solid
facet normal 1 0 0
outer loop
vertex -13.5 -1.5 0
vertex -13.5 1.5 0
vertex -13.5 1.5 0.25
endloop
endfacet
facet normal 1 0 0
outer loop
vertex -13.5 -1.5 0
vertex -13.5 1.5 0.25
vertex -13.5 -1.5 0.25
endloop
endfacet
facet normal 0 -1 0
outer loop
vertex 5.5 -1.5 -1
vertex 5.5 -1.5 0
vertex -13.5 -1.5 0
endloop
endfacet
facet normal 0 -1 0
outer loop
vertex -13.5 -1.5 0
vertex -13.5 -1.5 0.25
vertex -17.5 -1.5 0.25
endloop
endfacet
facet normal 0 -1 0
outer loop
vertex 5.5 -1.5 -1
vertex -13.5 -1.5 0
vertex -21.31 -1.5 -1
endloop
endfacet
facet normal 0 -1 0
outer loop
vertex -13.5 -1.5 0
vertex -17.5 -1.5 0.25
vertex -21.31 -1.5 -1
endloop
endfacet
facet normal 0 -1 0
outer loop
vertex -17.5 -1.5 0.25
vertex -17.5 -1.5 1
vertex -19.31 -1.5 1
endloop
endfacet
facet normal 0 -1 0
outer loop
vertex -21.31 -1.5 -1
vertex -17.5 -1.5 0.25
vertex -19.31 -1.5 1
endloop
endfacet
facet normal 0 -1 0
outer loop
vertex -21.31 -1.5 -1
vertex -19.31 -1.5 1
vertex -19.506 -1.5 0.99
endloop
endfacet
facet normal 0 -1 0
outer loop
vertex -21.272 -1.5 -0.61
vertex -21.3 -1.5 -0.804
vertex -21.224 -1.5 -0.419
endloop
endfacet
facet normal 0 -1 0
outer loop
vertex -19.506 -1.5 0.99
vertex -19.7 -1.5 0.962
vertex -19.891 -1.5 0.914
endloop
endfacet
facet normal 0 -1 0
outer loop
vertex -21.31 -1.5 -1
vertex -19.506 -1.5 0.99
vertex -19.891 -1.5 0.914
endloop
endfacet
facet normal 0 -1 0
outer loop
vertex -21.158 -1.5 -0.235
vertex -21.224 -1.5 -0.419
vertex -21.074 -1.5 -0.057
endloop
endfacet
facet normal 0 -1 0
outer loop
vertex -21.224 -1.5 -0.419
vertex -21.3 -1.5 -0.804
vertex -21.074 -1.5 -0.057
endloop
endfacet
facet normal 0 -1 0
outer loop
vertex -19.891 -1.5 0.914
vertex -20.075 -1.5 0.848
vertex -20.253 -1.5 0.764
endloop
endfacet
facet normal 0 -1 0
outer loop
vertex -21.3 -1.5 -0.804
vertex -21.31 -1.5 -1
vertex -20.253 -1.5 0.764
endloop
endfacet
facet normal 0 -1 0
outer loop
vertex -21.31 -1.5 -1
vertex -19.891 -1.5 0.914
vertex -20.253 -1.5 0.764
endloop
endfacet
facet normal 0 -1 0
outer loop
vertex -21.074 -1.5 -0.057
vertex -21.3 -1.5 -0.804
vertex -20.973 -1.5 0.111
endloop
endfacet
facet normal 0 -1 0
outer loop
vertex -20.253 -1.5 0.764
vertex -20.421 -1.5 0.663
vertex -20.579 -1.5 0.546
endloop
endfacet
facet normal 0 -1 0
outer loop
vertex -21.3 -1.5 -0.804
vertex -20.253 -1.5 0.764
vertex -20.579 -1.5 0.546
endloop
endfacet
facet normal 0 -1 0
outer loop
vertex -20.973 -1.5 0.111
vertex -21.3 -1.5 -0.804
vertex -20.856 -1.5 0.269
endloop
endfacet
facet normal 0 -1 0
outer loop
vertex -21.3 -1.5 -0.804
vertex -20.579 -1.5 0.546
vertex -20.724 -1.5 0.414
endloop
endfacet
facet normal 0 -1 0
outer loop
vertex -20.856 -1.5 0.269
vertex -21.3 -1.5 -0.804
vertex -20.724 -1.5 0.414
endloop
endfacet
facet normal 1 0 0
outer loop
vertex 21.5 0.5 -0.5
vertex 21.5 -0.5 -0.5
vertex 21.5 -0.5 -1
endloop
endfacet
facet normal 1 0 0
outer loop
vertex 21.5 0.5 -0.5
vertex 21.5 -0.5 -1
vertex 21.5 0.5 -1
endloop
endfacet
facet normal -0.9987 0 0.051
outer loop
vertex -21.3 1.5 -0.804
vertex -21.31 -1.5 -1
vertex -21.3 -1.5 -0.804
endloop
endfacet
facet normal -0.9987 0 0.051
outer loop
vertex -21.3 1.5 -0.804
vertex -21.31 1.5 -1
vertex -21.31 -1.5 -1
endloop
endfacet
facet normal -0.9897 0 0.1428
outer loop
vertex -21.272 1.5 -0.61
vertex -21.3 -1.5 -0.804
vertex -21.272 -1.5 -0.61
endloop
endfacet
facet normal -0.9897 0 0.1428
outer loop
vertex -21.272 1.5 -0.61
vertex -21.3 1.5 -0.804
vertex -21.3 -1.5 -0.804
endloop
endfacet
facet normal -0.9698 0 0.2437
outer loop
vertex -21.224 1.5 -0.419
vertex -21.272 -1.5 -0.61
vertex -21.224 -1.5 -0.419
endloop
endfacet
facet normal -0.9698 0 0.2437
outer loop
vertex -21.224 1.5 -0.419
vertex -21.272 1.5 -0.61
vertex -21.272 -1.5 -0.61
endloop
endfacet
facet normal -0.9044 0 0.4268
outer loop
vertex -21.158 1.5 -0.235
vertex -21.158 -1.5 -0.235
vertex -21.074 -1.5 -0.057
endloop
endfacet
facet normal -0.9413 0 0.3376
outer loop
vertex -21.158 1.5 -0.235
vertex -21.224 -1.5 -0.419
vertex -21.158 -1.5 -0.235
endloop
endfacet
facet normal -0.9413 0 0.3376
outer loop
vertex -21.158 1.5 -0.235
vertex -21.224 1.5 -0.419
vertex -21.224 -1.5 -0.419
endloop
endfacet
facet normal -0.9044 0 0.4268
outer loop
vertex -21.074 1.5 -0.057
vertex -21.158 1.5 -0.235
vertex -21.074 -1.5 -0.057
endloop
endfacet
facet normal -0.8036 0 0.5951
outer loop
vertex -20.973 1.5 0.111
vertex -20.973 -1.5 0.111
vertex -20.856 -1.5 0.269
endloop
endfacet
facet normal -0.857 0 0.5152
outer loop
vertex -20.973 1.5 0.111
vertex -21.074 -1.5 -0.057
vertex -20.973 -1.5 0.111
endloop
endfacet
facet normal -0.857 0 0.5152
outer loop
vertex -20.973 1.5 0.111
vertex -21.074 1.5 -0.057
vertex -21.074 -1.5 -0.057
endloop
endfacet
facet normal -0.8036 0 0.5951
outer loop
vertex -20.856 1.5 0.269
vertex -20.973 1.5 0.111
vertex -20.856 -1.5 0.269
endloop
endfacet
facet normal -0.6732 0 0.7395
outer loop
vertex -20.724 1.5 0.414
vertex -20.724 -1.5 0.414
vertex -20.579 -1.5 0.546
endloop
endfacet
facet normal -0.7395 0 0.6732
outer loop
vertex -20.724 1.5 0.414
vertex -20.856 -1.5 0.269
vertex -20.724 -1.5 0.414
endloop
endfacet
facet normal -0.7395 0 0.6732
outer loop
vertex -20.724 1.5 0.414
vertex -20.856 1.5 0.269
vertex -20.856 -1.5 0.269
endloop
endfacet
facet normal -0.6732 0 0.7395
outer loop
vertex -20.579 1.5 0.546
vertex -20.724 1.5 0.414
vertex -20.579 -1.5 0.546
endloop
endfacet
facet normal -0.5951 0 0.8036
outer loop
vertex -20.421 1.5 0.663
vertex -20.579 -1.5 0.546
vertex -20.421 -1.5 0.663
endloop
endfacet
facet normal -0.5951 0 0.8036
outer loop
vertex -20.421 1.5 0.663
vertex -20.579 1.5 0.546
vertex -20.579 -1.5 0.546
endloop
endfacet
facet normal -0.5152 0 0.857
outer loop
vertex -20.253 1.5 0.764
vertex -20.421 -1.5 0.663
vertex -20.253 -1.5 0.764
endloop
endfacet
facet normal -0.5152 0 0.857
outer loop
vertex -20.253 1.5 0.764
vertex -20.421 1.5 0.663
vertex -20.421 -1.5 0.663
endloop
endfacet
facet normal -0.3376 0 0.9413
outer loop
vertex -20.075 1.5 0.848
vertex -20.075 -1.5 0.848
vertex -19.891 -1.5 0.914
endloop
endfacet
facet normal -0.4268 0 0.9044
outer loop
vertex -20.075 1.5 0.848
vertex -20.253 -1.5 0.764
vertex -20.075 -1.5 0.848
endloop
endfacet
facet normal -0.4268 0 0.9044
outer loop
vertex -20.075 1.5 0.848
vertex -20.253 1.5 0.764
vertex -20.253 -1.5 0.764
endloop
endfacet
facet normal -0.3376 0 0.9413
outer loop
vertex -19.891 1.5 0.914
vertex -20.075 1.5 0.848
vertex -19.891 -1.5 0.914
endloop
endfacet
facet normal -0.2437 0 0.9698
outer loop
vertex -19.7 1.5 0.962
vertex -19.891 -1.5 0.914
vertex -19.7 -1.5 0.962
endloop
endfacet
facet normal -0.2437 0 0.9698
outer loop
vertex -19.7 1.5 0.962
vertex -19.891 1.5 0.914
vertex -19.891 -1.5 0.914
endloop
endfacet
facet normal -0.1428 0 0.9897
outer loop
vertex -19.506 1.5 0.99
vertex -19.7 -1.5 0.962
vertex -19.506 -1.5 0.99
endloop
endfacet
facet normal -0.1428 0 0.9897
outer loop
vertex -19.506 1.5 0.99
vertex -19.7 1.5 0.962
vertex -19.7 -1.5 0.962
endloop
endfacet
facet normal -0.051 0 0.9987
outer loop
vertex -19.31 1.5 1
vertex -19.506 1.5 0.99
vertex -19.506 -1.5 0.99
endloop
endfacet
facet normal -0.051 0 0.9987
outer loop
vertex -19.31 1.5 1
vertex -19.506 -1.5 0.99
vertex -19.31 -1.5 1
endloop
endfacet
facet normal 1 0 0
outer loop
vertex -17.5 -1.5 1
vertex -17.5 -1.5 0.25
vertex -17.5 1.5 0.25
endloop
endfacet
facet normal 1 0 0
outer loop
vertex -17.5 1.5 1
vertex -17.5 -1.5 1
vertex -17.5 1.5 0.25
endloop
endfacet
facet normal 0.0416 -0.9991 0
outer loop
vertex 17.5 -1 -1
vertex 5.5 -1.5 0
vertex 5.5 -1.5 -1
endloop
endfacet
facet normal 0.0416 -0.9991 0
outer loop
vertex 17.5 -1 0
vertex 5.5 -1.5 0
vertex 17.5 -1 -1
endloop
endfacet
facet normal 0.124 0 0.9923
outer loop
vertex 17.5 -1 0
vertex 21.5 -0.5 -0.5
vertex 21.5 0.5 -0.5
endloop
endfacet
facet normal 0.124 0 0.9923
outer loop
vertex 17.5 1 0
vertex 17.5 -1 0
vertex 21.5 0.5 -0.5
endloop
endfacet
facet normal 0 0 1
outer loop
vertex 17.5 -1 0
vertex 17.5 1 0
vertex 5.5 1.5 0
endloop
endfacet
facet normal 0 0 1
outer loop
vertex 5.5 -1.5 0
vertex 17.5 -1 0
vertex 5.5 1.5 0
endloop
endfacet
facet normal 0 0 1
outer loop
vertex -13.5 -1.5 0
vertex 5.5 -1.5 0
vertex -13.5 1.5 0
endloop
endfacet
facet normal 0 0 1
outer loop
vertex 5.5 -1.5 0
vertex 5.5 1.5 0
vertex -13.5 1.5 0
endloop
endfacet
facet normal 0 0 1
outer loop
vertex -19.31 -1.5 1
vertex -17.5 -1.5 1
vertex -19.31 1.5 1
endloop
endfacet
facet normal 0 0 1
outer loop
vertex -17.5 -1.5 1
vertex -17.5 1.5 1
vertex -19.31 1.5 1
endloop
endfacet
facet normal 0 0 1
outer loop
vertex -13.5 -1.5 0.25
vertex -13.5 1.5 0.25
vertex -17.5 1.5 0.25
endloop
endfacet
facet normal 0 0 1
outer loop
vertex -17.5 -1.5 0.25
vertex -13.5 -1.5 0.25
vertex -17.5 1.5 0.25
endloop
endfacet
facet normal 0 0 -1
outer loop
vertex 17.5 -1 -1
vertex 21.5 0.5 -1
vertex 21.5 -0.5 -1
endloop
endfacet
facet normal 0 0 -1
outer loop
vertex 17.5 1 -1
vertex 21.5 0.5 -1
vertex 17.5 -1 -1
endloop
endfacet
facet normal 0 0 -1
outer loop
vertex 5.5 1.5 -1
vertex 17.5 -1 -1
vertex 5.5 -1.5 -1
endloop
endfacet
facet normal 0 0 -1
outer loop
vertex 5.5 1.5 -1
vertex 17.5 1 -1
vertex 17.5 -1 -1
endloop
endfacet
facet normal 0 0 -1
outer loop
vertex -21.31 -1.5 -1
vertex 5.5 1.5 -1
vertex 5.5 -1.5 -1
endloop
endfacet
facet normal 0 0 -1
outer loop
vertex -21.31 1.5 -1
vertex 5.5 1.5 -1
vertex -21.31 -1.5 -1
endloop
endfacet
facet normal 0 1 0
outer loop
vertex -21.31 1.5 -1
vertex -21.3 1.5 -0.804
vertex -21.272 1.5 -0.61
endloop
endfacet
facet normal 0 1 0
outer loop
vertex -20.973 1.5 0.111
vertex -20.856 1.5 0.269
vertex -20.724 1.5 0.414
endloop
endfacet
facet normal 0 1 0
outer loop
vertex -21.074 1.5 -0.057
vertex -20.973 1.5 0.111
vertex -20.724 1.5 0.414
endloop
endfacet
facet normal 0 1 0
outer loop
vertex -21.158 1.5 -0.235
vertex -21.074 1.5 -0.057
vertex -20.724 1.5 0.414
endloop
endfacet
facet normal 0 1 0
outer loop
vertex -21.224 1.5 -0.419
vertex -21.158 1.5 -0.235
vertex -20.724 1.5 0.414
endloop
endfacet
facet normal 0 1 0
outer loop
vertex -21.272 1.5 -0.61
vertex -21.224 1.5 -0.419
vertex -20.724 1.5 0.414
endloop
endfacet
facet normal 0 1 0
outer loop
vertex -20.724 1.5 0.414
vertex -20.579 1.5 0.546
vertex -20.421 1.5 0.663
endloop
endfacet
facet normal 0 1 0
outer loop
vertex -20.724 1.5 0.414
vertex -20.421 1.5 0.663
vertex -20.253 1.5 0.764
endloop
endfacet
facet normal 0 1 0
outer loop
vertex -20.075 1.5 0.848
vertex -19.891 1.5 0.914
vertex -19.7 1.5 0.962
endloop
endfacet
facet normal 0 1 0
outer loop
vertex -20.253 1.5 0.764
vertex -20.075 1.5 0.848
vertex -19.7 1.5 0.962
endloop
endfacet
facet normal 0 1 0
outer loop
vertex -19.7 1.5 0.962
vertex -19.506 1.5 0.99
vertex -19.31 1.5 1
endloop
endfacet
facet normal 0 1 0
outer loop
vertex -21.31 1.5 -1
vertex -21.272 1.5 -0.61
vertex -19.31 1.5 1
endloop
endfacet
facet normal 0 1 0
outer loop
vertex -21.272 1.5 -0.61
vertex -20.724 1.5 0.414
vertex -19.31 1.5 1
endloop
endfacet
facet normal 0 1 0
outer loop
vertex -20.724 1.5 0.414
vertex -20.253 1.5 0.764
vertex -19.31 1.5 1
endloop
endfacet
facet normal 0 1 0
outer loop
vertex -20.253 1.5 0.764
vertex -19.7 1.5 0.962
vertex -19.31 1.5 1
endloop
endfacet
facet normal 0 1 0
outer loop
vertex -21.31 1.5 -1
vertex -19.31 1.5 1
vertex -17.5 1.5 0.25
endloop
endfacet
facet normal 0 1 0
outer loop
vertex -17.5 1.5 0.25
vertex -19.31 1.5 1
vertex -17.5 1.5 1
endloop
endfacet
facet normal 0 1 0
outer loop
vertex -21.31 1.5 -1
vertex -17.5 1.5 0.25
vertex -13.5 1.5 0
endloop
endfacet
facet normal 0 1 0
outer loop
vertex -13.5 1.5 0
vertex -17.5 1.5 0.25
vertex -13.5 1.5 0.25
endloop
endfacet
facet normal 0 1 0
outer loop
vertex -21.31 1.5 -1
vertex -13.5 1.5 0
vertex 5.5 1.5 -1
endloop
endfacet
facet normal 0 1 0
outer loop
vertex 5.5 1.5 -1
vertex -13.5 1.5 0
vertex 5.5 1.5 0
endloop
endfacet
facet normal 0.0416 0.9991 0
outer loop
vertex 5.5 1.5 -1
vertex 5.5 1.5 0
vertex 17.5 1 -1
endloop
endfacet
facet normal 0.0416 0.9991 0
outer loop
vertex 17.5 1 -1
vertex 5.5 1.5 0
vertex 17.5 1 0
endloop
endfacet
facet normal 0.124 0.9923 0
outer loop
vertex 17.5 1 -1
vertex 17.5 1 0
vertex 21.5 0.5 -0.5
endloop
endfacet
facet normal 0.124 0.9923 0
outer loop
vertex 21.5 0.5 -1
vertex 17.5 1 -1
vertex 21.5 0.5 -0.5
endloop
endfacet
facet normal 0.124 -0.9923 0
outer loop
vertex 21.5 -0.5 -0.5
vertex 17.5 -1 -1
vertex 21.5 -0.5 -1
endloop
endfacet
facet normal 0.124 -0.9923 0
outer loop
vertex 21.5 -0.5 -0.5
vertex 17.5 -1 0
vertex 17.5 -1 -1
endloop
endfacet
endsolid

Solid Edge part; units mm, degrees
sketch "Sketch1" plane through (0, 0, 0) normal (0, 0, 1) x (1, 0, 0)
  line L0 (-21.5, -1.5) -> (-21.5, 1.5)
  line L1 (-21.5, 1.5) -> (5.5, 1.5)
  line L2 (5.5, 1.5) -> (17.5, 1)
  line L3 (17.5, 1) -> (21.5, 0.5)
  line L4 (21.5, -0.5) -> (21.5, 0.5)
  line L5 (17.5, -1) -> (21.5, -0.5)
  line L6 (5.5, -1.5) -> (17.5, -1)
  line L7 (5.5, -1.5) -> (-21.5, -1.5)
extrude "Protrusion1" add sketch "Sketch1" against normal blind 1
sketch "Sketch2" plane through (0, 0, 0) normal (0, 0, 1) x (1, 0, 0)
  line L0 (-21.5, 1.5) -> (-17.5, 1.5)
  line L1 (-17.5, -1.5) -> (-17.5, 1.5)
  line L2 (-17.5, -1.5) -> (-21.5, -1.5)
  line L3 (-21.5, -1.5) -> (-21.5, 1.5)
extrude "ExtrudedProtrusion_2" add sketch "Sketch2" along normal blind 1
sketch "Sketch3" plane through (0, 0, 0) normal (0, 0, 1) x (1, 0, 0)
  line L0 (-17.5, -1.5) -> (-17.5, 1.5)
  line L1 (-17.5, 1.5) -> (-13.5, 1.5)
  line L2 (-13.5, 1.5) -> (-13.5, -1.5)
  line L3 (-13.5, -1.5) -> (-17.5, -1.5)
extrude "ExtrudedProtrusion_3" add sketch "Sketch3" along normal blind 0.25
chamfer "Chamfer_1" distance 4 distance2 0.5 1 edges at (21.5, 0, 0) measured on face at (16.0167, -0.97, 0)
sketch "Sketch4" plane through (-8, -1.5, 0) normal (0, -1, 0) x (1, 0, 0)
  line L0 (-13.31, 1) -> (-13.31, -1)
  line L1 (-13.31, -1) -> (-13.5, -1)
  line L2 (-13.5, -1) -> (-13.5, 1)
  line L3 (-13.5, 1) -> (-13.31, 1)
extrude "ExtrudedCutout_1" cut sketch "Sketch4" against normal blind 3
fillet "Round_5" radius 2 1 edges at (-21.31, 0, 1)
